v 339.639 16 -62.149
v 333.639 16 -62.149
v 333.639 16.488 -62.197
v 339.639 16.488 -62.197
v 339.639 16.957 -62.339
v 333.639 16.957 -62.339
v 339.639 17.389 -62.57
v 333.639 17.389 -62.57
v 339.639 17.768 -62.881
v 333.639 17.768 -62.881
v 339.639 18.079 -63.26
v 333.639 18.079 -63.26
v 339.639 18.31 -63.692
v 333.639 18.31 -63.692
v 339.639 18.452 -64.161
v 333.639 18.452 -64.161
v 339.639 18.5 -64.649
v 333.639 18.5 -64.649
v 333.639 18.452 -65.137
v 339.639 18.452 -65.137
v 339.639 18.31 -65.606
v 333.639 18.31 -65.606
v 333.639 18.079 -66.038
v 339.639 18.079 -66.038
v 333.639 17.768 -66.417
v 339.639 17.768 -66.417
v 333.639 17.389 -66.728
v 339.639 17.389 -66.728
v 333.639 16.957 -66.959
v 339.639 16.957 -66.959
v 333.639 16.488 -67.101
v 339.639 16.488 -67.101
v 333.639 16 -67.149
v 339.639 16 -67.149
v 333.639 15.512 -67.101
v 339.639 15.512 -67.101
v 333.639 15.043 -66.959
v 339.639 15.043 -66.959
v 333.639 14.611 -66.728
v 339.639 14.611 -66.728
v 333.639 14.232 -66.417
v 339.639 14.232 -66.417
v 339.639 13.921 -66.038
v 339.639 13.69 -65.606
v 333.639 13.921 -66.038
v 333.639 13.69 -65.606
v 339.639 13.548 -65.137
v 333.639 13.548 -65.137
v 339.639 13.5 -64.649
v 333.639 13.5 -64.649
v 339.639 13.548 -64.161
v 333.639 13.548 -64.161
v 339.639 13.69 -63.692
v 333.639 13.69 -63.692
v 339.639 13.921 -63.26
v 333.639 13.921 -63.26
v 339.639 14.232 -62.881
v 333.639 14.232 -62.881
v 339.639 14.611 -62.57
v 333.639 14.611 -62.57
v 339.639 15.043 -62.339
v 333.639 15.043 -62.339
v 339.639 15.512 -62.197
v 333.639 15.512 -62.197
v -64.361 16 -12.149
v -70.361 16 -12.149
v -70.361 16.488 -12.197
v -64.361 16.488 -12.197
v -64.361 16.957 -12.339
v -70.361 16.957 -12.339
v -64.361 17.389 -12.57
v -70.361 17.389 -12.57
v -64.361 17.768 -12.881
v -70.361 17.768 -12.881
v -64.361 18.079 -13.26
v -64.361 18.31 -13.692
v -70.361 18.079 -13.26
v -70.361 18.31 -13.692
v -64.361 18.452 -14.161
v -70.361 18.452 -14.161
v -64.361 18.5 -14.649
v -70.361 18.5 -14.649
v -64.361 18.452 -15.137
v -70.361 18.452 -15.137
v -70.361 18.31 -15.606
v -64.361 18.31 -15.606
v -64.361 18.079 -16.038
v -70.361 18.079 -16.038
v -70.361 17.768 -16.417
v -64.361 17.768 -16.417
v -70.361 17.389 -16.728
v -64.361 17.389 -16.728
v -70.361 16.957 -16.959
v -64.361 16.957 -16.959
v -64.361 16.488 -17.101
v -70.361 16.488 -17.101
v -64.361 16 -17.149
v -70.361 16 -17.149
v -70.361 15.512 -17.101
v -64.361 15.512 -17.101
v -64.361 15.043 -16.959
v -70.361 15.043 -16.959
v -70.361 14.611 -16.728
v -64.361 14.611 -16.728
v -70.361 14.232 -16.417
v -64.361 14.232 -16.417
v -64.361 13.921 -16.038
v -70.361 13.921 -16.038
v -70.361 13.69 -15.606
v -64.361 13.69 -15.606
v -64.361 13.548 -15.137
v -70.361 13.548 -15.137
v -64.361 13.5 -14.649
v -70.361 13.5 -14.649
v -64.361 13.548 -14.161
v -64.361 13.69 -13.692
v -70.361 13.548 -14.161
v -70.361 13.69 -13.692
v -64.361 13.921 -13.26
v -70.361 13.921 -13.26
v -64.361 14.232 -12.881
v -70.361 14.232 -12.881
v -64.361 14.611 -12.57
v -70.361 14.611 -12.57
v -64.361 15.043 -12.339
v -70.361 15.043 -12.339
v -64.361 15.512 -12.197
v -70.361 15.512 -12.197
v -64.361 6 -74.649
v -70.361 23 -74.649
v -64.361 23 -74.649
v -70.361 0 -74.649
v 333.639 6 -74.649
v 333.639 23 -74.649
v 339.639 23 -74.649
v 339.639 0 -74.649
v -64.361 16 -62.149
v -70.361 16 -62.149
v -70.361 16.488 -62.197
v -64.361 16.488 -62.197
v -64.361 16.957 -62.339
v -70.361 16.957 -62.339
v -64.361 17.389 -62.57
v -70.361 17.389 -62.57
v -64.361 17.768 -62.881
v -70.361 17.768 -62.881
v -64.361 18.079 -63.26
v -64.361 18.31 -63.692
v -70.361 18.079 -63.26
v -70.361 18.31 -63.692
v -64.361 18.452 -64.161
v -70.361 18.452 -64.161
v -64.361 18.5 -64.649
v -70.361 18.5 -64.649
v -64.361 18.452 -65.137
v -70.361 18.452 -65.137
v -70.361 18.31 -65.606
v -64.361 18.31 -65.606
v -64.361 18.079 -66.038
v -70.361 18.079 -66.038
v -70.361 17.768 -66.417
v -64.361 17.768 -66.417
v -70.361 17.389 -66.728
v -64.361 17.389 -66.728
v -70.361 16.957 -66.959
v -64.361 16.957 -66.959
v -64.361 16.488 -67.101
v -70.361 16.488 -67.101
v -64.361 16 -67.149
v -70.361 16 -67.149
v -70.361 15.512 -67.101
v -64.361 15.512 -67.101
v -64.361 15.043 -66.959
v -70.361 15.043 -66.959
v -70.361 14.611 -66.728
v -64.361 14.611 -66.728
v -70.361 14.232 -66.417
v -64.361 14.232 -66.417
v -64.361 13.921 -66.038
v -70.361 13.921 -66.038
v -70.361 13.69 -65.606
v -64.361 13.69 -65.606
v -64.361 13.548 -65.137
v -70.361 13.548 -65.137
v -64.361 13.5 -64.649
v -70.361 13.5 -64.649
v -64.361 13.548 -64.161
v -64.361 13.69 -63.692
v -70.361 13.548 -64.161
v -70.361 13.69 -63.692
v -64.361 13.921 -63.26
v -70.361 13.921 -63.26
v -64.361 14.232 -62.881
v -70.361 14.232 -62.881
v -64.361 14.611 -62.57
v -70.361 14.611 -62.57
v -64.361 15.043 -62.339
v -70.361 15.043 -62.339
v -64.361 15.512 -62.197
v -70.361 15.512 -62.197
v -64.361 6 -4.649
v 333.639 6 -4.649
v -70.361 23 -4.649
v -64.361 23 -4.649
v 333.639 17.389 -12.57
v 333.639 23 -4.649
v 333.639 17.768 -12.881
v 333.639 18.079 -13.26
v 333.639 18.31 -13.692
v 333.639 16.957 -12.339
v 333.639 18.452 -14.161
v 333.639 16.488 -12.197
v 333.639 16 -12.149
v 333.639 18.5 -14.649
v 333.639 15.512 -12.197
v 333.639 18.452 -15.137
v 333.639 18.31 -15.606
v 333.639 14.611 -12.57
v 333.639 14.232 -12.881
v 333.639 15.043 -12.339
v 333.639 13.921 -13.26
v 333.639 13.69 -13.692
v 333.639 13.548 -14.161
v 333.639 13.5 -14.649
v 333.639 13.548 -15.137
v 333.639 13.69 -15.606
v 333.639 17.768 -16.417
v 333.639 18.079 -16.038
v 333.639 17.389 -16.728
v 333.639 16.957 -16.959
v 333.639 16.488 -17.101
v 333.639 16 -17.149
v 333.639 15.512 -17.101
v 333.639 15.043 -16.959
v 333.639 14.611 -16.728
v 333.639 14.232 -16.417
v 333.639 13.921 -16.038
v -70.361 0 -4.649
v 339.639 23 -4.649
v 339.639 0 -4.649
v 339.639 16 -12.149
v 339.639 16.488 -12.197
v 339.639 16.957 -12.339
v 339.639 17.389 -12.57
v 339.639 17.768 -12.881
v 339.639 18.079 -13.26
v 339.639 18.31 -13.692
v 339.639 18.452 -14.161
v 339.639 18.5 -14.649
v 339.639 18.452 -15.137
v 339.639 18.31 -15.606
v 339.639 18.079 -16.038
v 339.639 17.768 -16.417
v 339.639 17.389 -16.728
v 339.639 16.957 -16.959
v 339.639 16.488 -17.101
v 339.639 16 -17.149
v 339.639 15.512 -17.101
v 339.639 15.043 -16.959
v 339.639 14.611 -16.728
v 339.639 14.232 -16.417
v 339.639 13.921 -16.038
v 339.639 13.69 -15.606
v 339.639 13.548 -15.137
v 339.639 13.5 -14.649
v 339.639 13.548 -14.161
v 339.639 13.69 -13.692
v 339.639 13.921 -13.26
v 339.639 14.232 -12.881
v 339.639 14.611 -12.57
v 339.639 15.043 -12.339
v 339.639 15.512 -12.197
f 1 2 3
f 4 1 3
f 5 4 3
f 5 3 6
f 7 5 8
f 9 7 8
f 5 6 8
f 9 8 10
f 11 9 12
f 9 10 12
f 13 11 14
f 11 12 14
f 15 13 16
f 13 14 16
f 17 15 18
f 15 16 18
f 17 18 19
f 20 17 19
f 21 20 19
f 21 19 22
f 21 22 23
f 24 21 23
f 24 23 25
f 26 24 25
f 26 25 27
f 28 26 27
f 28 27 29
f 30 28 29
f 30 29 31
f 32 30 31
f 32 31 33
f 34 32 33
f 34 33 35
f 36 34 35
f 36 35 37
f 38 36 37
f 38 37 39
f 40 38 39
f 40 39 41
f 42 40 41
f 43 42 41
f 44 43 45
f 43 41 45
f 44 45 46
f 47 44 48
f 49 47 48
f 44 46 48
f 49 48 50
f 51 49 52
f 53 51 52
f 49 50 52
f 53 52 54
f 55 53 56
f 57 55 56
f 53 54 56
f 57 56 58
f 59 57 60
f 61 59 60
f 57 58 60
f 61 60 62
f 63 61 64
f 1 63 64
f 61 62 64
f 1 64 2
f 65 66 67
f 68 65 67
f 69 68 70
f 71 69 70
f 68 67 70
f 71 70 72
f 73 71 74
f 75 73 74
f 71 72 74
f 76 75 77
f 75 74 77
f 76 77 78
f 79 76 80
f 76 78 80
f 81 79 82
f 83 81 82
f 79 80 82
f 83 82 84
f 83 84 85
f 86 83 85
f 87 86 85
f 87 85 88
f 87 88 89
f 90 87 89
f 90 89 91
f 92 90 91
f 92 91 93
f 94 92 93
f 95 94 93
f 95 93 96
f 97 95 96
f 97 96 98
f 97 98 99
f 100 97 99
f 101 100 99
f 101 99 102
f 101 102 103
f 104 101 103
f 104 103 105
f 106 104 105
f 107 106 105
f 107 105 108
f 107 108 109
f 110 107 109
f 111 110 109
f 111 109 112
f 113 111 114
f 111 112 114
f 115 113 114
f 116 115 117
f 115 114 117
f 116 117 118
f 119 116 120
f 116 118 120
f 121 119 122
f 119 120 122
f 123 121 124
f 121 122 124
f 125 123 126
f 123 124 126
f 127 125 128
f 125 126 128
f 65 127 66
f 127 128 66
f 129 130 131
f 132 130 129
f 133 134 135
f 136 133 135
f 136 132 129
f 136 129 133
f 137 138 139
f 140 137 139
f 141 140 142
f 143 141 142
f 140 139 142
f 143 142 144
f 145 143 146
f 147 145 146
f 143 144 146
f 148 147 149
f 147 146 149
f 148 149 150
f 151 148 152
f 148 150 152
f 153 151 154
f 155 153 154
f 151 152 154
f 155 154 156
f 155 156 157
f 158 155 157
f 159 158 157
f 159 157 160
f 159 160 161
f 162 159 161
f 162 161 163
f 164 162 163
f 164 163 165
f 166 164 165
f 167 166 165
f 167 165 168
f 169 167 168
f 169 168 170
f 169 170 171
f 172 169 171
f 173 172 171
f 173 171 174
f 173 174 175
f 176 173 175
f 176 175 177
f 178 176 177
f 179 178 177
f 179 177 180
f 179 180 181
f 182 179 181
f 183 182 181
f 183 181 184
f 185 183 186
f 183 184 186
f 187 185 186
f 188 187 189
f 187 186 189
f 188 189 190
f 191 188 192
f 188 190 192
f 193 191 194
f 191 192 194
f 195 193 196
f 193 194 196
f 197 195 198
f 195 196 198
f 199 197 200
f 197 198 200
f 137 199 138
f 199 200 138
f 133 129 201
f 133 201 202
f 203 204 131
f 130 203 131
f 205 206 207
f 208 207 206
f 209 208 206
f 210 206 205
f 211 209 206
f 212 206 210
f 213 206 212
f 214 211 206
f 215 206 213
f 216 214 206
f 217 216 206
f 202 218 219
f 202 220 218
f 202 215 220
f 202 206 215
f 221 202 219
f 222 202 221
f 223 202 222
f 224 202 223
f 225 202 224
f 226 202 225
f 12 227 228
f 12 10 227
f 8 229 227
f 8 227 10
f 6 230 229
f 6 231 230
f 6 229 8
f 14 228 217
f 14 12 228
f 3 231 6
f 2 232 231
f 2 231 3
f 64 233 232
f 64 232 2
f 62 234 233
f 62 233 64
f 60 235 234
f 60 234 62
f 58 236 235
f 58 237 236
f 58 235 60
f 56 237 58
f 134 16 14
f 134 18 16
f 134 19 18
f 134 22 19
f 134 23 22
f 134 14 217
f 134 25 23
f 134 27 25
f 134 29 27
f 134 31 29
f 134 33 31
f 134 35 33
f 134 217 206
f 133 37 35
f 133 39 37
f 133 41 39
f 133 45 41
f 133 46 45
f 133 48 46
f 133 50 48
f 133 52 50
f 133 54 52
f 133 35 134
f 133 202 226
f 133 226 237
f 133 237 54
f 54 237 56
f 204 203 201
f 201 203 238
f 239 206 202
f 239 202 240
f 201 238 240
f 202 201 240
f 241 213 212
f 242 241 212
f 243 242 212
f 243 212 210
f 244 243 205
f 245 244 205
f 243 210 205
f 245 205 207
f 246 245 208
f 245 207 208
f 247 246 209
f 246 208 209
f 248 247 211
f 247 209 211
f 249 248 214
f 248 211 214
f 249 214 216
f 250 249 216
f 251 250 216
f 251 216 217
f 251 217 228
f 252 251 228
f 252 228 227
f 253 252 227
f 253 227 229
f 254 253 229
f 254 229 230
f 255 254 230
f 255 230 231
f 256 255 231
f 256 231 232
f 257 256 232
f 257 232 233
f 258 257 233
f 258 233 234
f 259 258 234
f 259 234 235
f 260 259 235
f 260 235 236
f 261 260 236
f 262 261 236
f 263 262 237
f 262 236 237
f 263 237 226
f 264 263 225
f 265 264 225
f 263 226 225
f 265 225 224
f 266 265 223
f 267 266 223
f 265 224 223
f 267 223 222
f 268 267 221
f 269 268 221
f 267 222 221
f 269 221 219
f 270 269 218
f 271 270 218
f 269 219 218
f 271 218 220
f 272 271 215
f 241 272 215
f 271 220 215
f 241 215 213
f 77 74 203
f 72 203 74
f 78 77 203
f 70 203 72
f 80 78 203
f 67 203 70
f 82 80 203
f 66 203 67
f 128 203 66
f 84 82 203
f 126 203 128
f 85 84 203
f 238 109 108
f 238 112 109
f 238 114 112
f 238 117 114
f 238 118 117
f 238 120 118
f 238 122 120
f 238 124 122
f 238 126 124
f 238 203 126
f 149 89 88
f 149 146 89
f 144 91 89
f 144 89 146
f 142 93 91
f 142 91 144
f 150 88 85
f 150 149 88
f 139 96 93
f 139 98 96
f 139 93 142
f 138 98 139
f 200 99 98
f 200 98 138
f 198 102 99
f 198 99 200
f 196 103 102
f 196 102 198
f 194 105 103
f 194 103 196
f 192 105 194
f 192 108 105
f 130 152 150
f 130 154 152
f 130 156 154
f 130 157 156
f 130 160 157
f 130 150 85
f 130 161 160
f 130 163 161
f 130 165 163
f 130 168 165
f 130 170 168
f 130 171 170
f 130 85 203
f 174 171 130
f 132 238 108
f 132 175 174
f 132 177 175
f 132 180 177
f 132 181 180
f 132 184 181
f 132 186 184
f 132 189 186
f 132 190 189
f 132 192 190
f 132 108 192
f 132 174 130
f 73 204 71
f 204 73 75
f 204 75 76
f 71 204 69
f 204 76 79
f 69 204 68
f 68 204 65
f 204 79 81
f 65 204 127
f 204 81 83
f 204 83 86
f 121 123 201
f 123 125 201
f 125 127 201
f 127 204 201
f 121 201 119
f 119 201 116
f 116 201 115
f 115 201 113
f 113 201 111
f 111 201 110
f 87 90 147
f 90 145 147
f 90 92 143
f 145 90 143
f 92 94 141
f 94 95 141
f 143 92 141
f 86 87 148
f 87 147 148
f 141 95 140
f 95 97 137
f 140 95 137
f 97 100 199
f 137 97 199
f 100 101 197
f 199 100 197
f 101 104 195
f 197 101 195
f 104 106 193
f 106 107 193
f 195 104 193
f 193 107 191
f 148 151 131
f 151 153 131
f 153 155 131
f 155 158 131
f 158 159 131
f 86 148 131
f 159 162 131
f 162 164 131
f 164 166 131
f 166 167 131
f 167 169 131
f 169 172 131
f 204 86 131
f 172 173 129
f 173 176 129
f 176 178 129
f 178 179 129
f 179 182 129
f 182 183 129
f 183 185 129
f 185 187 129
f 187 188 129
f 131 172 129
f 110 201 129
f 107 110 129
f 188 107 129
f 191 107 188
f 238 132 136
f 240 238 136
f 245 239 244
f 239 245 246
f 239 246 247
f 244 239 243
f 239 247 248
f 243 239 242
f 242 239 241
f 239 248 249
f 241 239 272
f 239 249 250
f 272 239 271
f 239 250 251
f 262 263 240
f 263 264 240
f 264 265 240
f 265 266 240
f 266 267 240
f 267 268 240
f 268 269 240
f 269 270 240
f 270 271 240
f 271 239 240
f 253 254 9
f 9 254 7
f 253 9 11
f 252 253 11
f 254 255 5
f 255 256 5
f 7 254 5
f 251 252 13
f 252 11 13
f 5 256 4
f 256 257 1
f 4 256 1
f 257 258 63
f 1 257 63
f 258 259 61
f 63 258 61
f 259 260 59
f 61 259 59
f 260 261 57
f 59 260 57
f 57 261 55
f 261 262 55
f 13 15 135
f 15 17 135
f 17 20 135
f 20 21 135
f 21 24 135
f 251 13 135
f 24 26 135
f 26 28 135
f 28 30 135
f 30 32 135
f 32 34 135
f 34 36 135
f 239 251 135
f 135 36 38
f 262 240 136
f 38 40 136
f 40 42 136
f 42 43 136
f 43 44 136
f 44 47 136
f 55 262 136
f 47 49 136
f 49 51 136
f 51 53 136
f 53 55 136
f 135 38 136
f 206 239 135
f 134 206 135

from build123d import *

# Parameters (mm, degrees)
SKETCH1_W           = 410
SKETCH1_H           = 70
BOSS_EXTRUDE1_DEPTH = 6
SKETCH2_W           = 6
SKETCH2_H           = 70
BOSS_EXTRUDE2_DEPTH = 25
SKETCH3_R           = 2.5
CUT_EXTRUDE1_DEPTH  = 418.891673384
SKETCH4_W           = 70
SKETCH4_H           = 8
CUT_EXTRUDE2_DEPTH  = 418.891673384


with BuildPart() as part:
    # Sketch1 → Boss-Extrude1 (new body)
    with BuildSketch(Plane(origin=(0, 0, 0), x_dir=(1, 0, 0), z_dir=(0, 1, 0))):
        with Locations((134.639039491, 39.648849176)):
            Rectangle(SKETCH1_W, SKETCH1_H)
    extrude(amount=BOSS_EXTRUDE1_DEPTH)

    # Sketch2 → Boss-Extrude2 (add)
    with BuildSketch(Plane(origin=(0, 6, 0), x_dir=(1, 0, 0), z_dir=(0, 1, 0))):
        with Locations((-67.360960509, 39.648849176)):
            Rectangle(SKETCH2_W, SKETCH2_H)
        with Locations((336.639039491, 39.648849176)):
            Rectangle(SKETCH2_W, SKETCH2_H)
    extrude(amount=BOSS_EXTRUDE2_DEPTH)

    # Sketch3 → Cut-Extrude1 (cut, through all)
    with BuildSketch(Plane.ZY.offset(70.360960509)):
        with Locations((-64.648849176, 16)):
            Circle(SKETCH3_R)
        with Locations((-14.648849176, 16)):
            Circle(SKETCH3_R)
    extrude(amount=-CUT_EXTRUDE1_DEPTH, mode=Mode.SUBTRACT)

    # Sketch4 → Cut-Extrude2 (cut, through all)
    with BuildSketch(Plane(origin=(339.639039491, 0, 0), x_dir=(0, 0, -1), z_dir=(1, 0, 0))):
        with Locations((39.648849176, 27)):
            Rectangle(SKETCH4_W, SKETCH4_H)
    extrude(amount=-CUT_EXTRUDE2_DEPTH, mode=Mode.SUBTRACT)


solid = part.part
